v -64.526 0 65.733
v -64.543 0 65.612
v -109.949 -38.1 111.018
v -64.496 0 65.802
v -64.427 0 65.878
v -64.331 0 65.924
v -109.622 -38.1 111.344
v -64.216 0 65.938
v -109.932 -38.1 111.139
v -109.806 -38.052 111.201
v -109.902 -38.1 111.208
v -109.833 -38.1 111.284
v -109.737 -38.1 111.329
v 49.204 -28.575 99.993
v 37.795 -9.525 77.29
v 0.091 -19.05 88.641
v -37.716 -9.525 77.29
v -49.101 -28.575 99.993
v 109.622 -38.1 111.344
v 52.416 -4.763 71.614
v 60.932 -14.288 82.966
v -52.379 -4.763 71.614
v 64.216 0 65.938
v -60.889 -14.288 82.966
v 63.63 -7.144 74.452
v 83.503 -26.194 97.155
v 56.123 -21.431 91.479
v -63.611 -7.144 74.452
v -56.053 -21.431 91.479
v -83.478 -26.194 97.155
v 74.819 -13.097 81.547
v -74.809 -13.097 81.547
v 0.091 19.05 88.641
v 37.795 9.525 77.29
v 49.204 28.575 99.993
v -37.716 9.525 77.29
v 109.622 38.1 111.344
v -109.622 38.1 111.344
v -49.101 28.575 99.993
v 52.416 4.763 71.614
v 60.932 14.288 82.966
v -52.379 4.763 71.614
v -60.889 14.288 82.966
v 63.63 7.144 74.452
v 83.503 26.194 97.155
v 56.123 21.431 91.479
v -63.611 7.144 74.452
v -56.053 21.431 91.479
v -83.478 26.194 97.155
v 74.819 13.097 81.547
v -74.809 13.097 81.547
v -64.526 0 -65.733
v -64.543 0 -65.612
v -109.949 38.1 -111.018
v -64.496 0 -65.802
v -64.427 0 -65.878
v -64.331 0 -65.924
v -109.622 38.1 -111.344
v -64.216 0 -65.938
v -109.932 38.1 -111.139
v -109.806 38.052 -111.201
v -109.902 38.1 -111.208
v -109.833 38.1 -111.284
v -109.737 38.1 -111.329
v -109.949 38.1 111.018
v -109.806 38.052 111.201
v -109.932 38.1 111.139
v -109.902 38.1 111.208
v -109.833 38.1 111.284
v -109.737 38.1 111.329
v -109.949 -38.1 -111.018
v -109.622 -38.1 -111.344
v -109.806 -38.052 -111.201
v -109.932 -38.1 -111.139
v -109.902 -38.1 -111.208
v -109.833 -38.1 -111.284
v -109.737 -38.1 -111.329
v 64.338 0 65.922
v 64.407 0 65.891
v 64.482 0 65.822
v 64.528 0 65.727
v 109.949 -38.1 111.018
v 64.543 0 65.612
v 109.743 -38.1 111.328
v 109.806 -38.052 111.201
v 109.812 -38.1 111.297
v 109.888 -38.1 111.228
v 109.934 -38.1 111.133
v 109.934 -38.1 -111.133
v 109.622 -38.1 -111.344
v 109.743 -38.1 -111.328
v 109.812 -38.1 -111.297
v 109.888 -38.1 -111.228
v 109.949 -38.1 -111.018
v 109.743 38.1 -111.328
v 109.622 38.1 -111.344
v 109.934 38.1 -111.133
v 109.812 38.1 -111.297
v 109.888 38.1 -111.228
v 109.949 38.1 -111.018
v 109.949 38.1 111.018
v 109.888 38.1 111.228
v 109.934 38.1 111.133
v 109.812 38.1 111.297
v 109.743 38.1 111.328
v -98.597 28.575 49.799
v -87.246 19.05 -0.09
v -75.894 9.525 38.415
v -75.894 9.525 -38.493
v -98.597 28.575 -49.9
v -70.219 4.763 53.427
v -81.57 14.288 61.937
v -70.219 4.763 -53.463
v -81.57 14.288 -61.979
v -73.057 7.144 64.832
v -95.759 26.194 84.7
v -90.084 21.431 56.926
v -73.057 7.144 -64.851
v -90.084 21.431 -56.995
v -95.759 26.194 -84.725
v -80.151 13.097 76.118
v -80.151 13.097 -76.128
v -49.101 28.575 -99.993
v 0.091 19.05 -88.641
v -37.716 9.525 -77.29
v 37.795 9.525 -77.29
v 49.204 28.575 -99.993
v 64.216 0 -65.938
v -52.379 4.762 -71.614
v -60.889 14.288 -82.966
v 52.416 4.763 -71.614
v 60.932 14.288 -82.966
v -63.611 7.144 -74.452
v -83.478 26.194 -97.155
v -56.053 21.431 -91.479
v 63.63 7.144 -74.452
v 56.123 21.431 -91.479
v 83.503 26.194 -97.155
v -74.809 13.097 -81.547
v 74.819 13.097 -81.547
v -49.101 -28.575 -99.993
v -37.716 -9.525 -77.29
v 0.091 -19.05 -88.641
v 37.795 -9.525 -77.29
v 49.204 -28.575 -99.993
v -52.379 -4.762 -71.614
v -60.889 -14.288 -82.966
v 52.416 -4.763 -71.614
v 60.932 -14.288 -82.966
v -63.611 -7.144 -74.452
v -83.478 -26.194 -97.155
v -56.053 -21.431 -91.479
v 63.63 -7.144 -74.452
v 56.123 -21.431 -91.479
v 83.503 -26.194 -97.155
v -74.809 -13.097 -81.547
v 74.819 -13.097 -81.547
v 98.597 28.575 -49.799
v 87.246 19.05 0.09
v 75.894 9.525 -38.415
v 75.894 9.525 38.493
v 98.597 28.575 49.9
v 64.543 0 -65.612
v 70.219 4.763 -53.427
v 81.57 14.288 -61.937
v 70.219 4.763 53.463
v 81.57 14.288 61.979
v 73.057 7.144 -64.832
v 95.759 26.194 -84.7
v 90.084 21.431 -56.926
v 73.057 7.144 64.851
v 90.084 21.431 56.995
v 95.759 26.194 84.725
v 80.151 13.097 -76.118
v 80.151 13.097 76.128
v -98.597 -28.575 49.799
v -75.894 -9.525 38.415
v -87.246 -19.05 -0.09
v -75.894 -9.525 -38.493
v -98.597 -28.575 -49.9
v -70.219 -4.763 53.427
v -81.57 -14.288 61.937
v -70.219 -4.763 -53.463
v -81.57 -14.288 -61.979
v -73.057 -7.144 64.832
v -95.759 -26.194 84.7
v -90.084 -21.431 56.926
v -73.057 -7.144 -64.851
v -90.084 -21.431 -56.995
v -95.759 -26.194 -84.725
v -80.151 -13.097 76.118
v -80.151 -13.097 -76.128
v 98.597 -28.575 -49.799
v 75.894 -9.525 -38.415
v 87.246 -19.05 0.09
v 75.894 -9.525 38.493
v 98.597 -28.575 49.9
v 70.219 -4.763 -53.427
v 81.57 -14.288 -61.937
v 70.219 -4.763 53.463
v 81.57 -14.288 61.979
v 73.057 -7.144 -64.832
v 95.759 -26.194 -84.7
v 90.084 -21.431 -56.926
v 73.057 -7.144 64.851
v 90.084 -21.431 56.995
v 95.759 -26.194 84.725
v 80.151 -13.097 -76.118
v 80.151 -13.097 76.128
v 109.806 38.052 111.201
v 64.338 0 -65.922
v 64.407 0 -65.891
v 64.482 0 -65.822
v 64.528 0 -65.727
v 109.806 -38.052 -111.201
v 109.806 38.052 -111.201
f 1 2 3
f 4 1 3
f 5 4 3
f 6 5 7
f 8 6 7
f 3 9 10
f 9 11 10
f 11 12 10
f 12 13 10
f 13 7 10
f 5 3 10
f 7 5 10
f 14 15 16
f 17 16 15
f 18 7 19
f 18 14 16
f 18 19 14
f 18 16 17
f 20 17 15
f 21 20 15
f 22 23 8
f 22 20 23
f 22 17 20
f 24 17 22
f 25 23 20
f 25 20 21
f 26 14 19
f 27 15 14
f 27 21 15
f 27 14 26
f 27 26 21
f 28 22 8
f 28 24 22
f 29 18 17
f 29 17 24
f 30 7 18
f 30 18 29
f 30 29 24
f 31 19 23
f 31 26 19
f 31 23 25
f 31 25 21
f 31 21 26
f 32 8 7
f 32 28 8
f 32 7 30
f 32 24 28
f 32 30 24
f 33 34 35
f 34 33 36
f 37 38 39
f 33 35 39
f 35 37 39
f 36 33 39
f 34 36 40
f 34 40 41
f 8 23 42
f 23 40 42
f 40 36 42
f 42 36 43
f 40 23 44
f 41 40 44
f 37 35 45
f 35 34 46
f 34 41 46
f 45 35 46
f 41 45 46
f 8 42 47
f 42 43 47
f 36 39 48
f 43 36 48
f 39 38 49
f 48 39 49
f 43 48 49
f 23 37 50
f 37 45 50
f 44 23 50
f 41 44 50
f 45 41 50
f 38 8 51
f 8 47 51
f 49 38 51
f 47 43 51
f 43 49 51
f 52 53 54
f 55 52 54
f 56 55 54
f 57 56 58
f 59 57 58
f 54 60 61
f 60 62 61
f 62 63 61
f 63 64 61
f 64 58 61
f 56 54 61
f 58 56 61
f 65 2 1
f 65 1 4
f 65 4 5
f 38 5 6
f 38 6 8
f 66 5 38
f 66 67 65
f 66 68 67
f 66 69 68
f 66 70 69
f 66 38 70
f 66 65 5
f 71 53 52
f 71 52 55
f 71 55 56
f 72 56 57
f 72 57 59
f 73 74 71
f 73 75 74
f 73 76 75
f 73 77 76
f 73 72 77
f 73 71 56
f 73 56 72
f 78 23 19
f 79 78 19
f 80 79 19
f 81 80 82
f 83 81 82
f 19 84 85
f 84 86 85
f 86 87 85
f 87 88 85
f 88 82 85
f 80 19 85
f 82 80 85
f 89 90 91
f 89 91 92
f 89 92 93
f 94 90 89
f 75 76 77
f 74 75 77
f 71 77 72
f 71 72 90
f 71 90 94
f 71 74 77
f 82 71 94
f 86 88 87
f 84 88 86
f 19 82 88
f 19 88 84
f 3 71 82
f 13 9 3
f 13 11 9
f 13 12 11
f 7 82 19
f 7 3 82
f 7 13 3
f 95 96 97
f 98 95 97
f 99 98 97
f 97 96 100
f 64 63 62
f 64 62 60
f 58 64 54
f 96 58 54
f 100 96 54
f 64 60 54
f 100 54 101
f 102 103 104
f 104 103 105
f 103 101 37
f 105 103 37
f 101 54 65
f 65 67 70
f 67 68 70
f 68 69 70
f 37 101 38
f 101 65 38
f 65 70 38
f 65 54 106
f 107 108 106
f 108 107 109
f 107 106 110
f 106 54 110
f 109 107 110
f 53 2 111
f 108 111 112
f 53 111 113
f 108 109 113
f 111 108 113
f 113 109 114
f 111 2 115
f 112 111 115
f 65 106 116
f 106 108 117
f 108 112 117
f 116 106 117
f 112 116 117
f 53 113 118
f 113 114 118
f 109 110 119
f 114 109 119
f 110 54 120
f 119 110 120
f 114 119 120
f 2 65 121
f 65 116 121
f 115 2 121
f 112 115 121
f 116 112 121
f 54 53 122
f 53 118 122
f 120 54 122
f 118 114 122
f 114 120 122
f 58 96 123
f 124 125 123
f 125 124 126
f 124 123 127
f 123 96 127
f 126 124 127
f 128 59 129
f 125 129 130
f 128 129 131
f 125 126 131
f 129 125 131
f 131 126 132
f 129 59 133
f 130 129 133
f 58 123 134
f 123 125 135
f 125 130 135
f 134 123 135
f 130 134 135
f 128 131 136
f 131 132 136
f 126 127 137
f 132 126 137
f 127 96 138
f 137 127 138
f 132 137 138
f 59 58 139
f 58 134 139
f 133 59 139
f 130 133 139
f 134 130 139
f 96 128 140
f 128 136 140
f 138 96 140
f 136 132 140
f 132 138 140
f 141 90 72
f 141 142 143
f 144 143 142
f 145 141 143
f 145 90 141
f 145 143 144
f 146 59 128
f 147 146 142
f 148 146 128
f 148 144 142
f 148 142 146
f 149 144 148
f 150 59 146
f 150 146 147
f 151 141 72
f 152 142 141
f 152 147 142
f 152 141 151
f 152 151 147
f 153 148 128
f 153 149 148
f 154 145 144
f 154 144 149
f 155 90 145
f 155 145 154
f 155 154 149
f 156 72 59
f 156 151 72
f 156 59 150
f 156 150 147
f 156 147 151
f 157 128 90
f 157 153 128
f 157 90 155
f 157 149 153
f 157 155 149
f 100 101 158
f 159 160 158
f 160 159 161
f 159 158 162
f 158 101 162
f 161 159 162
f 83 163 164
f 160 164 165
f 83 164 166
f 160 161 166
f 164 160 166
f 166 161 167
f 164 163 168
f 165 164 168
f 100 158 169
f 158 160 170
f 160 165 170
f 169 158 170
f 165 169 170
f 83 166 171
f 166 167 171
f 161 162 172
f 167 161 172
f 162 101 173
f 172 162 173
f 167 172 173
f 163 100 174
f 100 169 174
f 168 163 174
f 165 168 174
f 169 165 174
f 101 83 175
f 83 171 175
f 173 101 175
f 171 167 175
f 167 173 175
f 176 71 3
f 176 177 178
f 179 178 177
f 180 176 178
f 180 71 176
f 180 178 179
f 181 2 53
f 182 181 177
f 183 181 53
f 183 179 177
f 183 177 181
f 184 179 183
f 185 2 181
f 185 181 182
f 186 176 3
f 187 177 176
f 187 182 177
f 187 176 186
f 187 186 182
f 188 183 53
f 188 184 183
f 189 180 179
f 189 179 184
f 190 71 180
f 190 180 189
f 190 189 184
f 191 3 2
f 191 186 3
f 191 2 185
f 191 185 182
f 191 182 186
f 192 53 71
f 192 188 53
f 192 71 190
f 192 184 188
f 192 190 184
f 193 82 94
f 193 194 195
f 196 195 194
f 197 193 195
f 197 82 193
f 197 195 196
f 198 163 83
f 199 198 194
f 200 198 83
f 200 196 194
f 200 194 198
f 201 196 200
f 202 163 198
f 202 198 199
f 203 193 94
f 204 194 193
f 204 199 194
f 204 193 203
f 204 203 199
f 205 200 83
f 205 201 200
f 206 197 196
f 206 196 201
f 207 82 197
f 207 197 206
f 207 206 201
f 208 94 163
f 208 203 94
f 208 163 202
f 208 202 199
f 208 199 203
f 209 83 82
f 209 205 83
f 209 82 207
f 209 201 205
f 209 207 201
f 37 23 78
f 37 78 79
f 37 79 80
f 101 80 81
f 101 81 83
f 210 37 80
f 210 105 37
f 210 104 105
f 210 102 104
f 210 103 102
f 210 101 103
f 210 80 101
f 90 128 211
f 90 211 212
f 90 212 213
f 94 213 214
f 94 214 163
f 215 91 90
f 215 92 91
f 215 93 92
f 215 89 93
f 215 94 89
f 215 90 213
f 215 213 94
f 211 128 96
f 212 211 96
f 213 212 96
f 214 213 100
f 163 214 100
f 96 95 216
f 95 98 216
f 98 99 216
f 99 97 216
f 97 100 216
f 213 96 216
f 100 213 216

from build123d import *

# Parameters (mm, degrees)
F0_W     = 129.0858983994
F0_H     = 131.8769454956
F1_DEPTH = 38.1
F1_TAPER = -50
F2_R     = 0.508


with BuildPart() as f1:
    # F0 (on Front) → F1 (new body, symmetric)
    with BuildSketch(Plane.XZ):
        Rectangle(F0_W, F0_H)
    extrude(amount=F1_DEPTH, both=True, taper=F1_TAPER)

    # F2
    f2_edges = [f1.edges().sort_by_distance(p)[0] for p in [
        (-87.245855, -19.05, -88.641379),
        (-87.245855, -19.05, 88.641379),
        (-87.245855, 19.05, -88.641379),
        (-87.245855, 19.05, 88.641379),
        (87.245855, -19.05, -88.641379),
        (87.245855, -19.05, 88.641379),
        (87.245855, 19.05, -88.641379),
        (87.245855, 19.05, 88.641379),
    ]]
    fillet(f2_edges, radius=F2_R)


solid = f1.part
